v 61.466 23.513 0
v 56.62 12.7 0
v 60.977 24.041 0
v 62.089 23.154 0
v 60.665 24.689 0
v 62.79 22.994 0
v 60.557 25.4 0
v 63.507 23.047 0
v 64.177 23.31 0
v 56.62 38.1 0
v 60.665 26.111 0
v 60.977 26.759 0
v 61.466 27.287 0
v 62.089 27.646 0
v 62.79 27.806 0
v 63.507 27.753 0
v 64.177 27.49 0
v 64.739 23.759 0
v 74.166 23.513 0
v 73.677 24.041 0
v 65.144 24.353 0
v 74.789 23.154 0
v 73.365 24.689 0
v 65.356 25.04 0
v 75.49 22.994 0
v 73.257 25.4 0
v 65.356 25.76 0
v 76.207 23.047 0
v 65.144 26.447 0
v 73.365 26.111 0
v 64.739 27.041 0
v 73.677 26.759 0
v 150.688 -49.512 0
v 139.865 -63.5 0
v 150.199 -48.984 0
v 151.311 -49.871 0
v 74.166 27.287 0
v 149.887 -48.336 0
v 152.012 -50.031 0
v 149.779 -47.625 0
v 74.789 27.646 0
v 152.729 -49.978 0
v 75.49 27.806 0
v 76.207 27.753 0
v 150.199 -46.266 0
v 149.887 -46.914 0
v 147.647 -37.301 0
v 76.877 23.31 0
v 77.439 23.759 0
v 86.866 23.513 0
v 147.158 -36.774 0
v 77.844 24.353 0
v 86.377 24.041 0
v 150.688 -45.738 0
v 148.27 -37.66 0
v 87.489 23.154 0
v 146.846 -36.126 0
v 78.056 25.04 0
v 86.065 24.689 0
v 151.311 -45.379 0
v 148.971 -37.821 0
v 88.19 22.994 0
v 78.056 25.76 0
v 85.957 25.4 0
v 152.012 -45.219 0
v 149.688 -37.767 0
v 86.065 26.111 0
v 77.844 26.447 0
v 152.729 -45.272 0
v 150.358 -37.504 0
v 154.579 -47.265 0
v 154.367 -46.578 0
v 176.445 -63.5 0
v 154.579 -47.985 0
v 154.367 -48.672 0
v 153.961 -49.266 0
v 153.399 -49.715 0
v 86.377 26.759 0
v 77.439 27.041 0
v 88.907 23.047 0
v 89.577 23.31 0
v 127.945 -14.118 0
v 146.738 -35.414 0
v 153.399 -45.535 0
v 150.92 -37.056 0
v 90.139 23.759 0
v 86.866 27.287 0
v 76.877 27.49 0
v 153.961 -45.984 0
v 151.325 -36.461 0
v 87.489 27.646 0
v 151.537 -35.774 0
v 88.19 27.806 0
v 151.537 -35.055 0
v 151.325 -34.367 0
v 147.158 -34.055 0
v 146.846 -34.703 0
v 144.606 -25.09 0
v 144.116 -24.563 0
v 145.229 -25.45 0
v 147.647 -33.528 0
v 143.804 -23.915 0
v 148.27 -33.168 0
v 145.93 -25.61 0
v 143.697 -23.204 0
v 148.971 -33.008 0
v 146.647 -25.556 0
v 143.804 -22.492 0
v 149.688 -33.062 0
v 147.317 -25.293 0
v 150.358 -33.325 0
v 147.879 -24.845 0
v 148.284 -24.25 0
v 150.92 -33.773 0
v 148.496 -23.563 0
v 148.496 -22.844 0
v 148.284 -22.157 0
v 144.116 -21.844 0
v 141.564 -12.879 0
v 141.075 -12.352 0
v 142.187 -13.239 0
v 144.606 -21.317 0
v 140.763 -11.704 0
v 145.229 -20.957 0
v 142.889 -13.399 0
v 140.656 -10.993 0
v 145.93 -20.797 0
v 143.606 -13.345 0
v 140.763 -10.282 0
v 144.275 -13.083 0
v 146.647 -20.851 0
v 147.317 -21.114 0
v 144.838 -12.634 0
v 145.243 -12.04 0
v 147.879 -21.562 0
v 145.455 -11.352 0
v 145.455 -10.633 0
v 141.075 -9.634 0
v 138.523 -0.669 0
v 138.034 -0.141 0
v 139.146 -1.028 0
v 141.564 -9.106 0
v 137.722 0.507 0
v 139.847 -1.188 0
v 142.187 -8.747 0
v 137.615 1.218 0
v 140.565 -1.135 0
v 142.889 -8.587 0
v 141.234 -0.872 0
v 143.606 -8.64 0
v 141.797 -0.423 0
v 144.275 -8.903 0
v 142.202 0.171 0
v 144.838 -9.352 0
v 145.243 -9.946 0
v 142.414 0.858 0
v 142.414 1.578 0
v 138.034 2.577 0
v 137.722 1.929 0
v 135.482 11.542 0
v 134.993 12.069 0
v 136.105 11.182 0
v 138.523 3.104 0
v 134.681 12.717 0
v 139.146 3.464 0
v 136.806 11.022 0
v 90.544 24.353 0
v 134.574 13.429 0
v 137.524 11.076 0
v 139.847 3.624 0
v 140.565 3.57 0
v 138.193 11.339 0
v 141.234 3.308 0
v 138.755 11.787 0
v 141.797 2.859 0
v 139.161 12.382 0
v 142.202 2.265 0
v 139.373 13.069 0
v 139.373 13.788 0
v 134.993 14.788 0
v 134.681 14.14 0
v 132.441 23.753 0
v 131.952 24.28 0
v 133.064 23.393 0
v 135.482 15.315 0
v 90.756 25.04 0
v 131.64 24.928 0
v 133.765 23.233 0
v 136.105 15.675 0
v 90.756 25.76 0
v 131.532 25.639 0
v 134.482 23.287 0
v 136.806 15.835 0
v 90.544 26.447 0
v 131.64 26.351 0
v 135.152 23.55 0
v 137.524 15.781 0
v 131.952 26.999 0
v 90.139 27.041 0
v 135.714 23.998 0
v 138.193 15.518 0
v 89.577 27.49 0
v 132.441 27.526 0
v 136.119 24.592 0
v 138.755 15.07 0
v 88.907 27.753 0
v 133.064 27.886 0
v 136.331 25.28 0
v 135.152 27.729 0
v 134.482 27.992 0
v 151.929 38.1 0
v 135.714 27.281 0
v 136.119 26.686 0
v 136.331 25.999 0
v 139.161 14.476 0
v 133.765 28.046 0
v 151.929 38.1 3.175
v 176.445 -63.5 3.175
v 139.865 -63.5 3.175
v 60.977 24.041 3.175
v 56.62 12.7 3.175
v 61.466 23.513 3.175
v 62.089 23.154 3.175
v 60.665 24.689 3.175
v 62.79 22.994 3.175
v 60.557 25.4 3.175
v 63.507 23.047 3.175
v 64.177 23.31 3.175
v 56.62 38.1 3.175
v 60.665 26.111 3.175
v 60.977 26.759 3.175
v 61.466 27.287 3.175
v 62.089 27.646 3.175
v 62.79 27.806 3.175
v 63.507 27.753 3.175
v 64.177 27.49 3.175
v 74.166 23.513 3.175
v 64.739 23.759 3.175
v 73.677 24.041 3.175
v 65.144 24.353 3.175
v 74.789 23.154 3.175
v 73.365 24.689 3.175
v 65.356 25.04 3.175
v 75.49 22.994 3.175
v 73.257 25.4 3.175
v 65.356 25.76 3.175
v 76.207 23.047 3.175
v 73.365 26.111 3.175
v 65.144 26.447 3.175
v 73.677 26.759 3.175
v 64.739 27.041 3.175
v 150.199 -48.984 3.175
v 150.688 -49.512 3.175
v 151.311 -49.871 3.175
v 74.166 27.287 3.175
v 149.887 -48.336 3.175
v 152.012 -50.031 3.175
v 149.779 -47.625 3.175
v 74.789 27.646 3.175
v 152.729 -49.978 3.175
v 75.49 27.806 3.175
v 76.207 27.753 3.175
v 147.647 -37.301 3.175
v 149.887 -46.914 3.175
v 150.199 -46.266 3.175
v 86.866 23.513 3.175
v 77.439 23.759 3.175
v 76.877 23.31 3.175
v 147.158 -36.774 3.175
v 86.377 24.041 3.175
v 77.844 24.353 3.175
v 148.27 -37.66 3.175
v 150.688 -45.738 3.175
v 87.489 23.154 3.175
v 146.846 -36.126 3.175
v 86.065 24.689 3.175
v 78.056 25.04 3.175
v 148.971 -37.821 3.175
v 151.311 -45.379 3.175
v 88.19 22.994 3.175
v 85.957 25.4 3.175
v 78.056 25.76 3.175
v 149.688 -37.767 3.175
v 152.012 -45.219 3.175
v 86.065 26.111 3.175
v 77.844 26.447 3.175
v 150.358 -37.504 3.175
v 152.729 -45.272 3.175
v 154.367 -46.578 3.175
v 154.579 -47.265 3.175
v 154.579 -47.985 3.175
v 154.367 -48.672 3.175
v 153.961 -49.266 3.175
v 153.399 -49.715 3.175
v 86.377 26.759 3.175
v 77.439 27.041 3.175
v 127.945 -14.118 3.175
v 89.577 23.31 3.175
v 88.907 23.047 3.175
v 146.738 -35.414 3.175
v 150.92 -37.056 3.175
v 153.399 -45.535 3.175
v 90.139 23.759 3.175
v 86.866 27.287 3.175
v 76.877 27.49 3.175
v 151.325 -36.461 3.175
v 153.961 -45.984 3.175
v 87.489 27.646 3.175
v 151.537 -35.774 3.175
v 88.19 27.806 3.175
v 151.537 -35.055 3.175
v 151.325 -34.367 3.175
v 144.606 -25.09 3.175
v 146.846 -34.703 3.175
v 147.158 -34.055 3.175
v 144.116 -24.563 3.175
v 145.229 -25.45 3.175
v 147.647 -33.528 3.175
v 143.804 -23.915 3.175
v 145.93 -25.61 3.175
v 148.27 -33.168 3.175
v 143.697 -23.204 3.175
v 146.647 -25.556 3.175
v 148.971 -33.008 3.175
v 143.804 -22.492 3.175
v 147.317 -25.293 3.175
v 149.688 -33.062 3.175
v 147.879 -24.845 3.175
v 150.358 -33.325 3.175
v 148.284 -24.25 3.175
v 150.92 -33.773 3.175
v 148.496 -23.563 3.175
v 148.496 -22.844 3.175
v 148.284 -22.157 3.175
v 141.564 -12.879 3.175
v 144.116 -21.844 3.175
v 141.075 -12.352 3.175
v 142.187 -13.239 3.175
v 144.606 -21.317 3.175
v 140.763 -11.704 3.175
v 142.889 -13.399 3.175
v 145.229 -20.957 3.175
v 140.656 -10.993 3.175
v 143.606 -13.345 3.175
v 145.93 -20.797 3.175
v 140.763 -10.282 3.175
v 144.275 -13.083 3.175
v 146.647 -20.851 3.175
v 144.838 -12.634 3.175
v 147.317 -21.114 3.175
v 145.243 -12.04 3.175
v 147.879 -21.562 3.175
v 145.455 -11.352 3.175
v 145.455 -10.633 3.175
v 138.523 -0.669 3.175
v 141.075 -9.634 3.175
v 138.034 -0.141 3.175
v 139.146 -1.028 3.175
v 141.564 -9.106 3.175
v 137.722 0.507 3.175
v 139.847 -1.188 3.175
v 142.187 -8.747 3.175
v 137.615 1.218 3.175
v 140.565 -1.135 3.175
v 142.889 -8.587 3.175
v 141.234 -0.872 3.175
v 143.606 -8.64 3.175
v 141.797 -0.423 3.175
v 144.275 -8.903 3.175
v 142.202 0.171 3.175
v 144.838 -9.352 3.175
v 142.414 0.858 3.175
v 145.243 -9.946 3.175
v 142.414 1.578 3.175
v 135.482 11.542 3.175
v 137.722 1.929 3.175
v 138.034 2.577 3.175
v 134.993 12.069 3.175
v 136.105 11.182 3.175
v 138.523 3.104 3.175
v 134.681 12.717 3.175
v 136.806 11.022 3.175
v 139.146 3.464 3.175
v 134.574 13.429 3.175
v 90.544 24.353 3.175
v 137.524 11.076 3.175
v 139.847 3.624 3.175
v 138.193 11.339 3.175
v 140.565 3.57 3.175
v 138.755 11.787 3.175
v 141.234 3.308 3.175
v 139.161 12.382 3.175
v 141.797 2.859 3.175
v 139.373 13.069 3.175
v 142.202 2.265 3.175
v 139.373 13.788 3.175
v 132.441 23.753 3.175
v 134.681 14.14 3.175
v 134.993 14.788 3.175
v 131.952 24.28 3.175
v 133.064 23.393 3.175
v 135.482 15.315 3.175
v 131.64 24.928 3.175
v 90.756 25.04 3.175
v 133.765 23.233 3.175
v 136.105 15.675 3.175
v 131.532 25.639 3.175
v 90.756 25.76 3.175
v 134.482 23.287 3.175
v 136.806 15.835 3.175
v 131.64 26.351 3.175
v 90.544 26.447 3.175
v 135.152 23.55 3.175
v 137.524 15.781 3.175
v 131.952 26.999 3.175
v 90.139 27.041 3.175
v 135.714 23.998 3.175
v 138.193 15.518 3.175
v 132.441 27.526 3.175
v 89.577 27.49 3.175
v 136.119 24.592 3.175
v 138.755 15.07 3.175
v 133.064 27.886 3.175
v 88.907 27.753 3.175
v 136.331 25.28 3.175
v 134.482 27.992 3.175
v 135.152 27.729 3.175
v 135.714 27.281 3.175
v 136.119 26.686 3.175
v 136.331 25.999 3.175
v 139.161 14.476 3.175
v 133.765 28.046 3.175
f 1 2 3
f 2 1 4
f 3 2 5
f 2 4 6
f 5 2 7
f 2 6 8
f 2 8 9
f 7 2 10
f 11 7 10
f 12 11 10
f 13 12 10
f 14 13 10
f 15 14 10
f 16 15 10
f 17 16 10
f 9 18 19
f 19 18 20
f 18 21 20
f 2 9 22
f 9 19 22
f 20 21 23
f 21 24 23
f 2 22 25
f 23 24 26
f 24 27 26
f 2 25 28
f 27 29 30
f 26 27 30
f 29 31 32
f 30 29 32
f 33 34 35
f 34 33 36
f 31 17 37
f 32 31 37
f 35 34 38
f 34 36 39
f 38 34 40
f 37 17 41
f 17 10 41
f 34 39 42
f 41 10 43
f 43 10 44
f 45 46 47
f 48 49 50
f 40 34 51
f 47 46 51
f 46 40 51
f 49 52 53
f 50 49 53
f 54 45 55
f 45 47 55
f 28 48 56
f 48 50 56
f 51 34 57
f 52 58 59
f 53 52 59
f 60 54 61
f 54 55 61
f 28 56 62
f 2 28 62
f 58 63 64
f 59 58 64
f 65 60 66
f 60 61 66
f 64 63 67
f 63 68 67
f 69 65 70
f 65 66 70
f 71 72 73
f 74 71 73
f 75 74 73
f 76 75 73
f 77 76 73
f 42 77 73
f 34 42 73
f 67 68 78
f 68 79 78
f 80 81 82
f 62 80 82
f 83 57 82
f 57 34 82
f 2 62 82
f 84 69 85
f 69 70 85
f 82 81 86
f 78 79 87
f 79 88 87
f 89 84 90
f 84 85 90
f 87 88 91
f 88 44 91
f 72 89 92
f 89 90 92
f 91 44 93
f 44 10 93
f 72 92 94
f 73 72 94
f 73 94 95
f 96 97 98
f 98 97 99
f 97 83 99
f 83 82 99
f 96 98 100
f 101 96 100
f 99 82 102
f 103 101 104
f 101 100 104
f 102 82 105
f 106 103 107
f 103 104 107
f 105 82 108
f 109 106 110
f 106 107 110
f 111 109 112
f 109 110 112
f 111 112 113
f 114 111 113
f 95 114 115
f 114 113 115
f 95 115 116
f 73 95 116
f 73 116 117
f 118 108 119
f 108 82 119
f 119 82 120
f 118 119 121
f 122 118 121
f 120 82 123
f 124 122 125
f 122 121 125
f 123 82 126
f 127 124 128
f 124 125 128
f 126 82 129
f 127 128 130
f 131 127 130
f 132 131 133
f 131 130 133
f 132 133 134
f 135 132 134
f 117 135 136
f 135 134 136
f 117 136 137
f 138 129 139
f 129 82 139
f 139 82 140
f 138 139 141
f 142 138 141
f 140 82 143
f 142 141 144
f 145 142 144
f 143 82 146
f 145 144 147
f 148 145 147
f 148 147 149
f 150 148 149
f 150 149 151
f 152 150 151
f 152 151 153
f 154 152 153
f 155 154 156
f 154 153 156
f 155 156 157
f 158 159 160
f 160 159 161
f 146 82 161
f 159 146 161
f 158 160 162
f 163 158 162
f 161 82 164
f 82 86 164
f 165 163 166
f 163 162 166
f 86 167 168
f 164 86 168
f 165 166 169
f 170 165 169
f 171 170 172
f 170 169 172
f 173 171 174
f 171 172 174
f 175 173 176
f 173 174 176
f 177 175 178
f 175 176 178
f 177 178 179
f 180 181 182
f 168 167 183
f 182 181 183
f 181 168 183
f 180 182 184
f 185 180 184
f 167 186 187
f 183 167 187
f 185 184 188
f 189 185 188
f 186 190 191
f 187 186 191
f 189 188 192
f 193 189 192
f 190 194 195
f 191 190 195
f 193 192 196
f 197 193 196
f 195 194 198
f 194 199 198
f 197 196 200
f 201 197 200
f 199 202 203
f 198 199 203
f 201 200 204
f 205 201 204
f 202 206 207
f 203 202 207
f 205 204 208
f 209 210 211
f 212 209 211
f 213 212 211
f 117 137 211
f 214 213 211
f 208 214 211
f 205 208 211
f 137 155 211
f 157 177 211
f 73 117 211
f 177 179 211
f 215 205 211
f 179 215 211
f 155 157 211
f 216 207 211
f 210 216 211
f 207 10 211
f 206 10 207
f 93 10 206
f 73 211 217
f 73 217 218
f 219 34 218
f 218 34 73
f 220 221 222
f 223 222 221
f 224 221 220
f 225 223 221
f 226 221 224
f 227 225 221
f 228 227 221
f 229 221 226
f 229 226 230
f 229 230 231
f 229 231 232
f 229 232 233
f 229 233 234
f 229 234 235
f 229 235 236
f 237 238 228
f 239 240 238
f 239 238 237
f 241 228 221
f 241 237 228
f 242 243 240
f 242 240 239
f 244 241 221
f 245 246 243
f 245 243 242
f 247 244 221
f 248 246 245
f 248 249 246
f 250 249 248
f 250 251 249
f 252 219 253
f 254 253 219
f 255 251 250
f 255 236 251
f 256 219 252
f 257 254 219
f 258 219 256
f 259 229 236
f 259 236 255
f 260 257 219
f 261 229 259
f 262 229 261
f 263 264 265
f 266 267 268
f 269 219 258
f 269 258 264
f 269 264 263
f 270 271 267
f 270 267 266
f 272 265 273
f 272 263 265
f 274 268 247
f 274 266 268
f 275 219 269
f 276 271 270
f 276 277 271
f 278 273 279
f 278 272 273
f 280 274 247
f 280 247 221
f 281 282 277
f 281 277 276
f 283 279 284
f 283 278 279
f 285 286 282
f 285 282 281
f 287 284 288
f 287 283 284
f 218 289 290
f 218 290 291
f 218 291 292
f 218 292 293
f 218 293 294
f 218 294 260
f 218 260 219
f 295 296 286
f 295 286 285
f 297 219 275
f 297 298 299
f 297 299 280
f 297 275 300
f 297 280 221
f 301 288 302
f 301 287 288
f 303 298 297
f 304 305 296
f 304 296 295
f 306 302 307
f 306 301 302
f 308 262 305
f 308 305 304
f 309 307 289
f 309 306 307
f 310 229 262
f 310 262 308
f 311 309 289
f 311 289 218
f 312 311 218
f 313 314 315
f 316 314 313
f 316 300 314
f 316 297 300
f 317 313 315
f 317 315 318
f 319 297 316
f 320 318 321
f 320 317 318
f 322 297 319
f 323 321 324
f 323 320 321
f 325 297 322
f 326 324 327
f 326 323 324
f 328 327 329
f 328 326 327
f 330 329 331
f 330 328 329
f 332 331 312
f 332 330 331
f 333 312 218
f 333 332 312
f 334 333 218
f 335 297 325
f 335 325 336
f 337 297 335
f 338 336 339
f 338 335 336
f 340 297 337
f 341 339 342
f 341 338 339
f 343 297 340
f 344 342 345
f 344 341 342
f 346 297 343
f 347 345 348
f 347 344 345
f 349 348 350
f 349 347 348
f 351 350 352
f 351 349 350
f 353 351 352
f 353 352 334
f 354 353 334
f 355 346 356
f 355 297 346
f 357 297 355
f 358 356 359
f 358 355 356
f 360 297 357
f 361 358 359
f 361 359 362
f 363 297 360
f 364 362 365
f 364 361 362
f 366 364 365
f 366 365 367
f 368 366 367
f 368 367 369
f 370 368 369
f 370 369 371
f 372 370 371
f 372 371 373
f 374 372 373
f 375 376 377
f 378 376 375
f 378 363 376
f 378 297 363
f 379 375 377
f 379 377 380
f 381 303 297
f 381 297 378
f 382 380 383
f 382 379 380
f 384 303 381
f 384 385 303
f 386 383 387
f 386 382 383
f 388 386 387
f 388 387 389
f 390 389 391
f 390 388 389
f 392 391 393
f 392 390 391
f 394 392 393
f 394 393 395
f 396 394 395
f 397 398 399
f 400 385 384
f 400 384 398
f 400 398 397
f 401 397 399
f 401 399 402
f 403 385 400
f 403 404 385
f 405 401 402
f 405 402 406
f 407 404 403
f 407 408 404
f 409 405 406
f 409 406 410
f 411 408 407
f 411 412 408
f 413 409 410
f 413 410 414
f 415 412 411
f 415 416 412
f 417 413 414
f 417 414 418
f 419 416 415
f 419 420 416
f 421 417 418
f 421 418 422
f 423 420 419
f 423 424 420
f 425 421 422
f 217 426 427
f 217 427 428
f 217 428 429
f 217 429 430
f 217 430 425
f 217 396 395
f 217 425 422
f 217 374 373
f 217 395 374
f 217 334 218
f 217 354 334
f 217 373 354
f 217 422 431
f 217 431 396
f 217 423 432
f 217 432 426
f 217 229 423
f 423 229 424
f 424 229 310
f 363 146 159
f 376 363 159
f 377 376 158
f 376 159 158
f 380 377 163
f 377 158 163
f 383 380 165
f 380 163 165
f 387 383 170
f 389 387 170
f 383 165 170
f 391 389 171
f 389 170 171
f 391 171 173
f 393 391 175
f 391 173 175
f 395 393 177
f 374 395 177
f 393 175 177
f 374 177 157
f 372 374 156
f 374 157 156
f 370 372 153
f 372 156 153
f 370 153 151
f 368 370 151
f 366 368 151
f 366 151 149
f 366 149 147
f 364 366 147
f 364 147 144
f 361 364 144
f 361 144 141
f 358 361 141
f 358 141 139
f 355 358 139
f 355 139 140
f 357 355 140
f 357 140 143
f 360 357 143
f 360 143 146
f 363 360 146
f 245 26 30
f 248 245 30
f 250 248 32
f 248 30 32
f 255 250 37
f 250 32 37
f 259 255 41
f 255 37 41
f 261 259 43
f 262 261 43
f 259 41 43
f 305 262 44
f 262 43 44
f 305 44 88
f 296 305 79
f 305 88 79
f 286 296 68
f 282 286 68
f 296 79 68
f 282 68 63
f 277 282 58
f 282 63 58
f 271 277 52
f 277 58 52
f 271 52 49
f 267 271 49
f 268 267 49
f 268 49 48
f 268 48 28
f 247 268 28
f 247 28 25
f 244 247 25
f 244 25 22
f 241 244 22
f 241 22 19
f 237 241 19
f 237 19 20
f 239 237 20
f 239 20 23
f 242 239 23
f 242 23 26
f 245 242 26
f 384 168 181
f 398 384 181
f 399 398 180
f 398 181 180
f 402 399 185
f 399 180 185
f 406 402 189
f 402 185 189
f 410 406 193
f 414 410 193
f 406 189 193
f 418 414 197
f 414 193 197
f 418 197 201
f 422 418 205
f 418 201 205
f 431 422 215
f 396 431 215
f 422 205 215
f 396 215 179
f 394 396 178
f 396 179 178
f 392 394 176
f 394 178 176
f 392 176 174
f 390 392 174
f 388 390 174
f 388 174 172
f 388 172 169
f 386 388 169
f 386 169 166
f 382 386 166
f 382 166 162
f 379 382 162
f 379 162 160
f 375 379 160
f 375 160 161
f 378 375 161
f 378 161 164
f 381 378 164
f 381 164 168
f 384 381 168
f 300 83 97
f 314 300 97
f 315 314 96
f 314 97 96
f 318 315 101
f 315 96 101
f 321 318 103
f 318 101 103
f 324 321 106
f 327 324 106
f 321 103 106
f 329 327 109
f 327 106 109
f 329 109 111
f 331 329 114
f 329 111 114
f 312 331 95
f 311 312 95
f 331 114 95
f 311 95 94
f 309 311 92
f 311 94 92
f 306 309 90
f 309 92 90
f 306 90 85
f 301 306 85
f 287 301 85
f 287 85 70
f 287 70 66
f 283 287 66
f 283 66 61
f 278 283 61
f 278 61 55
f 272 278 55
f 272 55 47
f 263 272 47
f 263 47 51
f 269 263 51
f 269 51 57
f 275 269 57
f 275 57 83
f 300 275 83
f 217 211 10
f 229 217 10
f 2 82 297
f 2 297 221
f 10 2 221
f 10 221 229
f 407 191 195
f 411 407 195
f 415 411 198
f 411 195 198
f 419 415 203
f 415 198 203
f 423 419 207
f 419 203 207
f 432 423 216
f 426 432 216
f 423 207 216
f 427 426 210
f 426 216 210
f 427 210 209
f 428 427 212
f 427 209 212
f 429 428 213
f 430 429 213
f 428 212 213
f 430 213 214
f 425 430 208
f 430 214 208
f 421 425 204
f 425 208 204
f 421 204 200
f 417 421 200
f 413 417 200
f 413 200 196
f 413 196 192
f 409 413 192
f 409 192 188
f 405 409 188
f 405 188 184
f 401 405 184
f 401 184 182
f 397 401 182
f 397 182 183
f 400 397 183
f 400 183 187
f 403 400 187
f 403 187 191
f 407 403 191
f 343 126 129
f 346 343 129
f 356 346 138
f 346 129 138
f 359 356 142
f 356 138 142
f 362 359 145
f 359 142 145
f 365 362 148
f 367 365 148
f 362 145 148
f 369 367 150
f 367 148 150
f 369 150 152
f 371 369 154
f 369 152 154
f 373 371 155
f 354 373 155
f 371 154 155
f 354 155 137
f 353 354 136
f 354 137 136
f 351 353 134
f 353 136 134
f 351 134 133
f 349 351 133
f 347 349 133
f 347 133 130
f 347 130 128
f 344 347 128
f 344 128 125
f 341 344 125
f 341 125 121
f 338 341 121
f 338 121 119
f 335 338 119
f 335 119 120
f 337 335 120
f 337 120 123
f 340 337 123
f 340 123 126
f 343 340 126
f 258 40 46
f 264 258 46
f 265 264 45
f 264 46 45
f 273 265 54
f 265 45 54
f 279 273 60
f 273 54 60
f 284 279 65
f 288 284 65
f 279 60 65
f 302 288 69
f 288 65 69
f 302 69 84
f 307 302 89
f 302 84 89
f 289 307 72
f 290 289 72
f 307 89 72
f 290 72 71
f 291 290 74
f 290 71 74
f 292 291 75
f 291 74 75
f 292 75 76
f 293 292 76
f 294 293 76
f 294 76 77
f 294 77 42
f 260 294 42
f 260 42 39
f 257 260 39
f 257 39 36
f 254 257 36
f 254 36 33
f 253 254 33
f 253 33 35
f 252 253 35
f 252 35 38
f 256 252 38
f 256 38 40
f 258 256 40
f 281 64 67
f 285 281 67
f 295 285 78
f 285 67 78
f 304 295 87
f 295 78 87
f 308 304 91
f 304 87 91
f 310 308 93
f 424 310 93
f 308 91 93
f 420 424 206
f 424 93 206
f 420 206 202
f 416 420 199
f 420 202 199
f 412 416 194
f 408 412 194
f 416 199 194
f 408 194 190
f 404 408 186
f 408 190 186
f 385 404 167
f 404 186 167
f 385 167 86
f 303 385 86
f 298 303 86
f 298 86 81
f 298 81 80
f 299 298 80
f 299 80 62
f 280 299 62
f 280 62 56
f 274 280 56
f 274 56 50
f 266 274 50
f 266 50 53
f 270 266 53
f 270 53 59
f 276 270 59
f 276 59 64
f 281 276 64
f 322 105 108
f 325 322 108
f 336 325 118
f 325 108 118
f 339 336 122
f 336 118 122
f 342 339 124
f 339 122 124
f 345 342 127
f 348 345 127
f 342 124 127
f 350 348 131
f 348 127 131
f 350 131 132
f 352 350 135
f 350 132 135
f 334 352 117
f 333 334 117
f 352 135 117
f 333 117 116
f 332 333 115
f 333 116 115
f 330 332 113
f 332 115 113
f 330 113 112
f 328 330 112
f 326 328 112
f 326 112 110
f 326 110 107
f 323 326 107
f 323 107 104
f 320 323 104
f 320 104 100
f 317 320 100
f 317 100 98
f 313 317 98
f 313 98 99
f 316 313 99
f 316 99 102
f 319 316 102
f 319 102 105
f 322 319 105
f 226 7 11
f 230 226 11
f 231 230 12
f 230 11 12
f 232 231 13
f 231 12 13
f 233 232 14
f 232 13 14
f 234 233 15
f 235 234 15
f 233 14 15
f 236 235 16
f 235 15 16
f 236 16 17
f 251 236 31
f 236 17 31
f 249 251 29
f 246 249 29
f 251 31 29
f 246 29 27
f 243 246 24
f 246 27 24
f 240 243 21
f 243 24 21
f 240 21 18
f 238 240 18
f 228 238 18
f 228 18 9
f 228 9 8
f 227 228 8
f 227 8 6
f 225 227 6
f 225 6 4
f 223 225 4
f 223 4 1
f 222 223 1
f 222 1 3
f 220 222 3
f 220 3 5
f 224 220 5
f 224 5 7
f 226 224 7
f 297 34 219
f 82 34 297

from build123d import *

# Parameters (mm, degrees)
SKETCH1_W           = 381
SKETCH1_H           = 177.8
BOSS_EXTRUDE1_DEPTH = 3.175
CUT_EXTRUDE1_DEPTH  = 211.246380766
CUT_EXTRUDE2_DEPTH  = 205.829884405
CUT_EXTRUDE3_DEPTH  = 200.326767223
SKETCH9_R           = 2.413
CUT_EXTRUDE5_DEPTH  = 200.326767223
CUT_EXTRUDE6_DEPTH  = 200.326767223
CUT_EXTRUDE7_DEPTH  = 190.367896253
SKETCH12_R          = 2.413
CUT_EXTRUDE8_DEPTH  = 188.550586603


with BuildPart() as part:
    # Sketch1 → Boss-Extrude1 (new body)
    with BuildSketch(Plane.XY):
        Rectangle(SKETCH1_W, SKETCH1_H)
    extrude(amount=BOSS_EXTRUDE1_DEPTH)

    # Sketch3 → Cut-Extrude1 (cut, through all)
    with BuildSketch(Plane(origin=(0, 0, 0), x_dir=(-1, 0, 0), z_dir=(0, 0, -1))):
        Polygon((-190.5, 88.9), (-139.670694847, 88.9), (-190.5, -121.745827518), align=None)
        Polygon((190.5, 88.9), (141.601183723, 88.9), (190.5, -113.745532698), align=None)
    extrude(amount=-CUT_EXTRUDE1_DEPTH, mode=Mode.SUBTRACT)

    # Sketch4 → Cut-Extrude2 (cut, through all)
    with BuildSketch(Plane(origin=(0, 0, 0), x_dir=(-1, 0, 0), z_dir=(0, 0, -1))):
        Polygon((178.375641573, -63.5), (-176.445152697, -63.5), (-182.574229005, -88.9), (184.504717881, -88.9), align=None)
    extrude(amount=-CUT_EXTRUDE2_DEPTH, mode=Mode.SUBTRACT)

    # Sketch8 → Cut-Extrude3 (cut, through all)
    with BuildSketch(Plane(origin=(0, 0, 0), x_dir=(-1, 0, 0), z_dir=(0, 0, -1))):
        Polygon((-139.864527638, -63.5), (-127.945162942, -14.118133437), (132.284027695, -14.118133437), (144.203392391, -63.5), align=None)
    extrude(amount=-CUT_EXTRUDE3_DEPTH, mode=Mode.SUBTRACT)

    # Sketch9 → Cut-Extrude5 (cut, through all)
    with BuildSketch(Plane(origin=(0, 0, 0), x_dir=(-1, 0, 0), z_dir=(0, 0, -1))):
        with Locations((-152.192493977, -47.625)):
            Circle(SKETCH9_R)
        with Locations((-149.151314542, -35.414265987)):
            Circle(SKETCH9_R)
        with Locations((-146.110135107, -23.203531973)):
            Circle(SKETCH9_R)
        with Locations((-143.068955672, -10.99279796)):
            Circle(SKETCH9_R)
        with Locations((-140.027776237, 1.217936053)):
            Circle(SKETCH9_R)
        with Locations((-136.986596801, 13.428670067)):
            Circle(SKETCH9_R)
        with Locations((-133.945417366, 25.63940408)):
            Circle(SKETCH9_R)
        with Locations((-124.821879061, 62.27160612)):
            Circle(SKETCH9_R)
        with Locations((-121.780699626, 74.482340133)):
            Circle(SKETCH9_R)
    extrude(amount=-CUT_EXTRUDE5_DEPTH, mode=Mode.SUBTRACT)

    # Sketch10 → Cut-Extrude6 (cut, through all)
    with BuildSketch(Plane(origin=(0, 0, 0), x_dir=(-1, 0, 0), z_dir=(0, 0, -1))):
        Polygon((-139.670694847, 88.9), (-151.928847464, 38.1), (153.859336339, 38.1), (141.601183723, 88.9), align=None)
    extrude(amount=-CUT_EXTRUDE6_DEPTH, mode=Mode.SUBTRACT)

    # Sketch11 → Cut-Extrude7 (cut, through all)
    with BuildSketch(Plane(origin=(0, 0, 0), x_dir=(-1, 0, 0), z_dir=(0, 0, -1))):
        Polygon((-127.945162942, -14.118133437), (-56.620358568, 12.7), (-56.620358568, 38.1), (60.959223321, 38.1), (153.859336339, 38.1), (178.375641573, -63.5), (144.203392391, -63.5), (132.284027695, -14.118133437), align=None)
    extrude(amount=-CUT_EXTRUDE7_DEPTH, mode=Mode.SUBTRACT)

    # Sketch12 → Cut-Extrude8 (cut, through all)
    with BuildSketch(Plane(origin=(0, 0, 0), x_dir=(-1, 0, 0), z_dir=(0, 0, -1))):
        with Locations((-62.970358568, 25.4)):
            Circle(SKETCH12_R)
        with Locations((-75.670358568, 25.4)):
            Circle(SKETCH12_R)
        with Locations((-88.370358568, 25.4)):
            Circle(SKETCH12_R)
    extrude(amount=-CUT_EXTRUDE8_DEPTH, mode=Mode.SUBTRACT)


solid = part.part
